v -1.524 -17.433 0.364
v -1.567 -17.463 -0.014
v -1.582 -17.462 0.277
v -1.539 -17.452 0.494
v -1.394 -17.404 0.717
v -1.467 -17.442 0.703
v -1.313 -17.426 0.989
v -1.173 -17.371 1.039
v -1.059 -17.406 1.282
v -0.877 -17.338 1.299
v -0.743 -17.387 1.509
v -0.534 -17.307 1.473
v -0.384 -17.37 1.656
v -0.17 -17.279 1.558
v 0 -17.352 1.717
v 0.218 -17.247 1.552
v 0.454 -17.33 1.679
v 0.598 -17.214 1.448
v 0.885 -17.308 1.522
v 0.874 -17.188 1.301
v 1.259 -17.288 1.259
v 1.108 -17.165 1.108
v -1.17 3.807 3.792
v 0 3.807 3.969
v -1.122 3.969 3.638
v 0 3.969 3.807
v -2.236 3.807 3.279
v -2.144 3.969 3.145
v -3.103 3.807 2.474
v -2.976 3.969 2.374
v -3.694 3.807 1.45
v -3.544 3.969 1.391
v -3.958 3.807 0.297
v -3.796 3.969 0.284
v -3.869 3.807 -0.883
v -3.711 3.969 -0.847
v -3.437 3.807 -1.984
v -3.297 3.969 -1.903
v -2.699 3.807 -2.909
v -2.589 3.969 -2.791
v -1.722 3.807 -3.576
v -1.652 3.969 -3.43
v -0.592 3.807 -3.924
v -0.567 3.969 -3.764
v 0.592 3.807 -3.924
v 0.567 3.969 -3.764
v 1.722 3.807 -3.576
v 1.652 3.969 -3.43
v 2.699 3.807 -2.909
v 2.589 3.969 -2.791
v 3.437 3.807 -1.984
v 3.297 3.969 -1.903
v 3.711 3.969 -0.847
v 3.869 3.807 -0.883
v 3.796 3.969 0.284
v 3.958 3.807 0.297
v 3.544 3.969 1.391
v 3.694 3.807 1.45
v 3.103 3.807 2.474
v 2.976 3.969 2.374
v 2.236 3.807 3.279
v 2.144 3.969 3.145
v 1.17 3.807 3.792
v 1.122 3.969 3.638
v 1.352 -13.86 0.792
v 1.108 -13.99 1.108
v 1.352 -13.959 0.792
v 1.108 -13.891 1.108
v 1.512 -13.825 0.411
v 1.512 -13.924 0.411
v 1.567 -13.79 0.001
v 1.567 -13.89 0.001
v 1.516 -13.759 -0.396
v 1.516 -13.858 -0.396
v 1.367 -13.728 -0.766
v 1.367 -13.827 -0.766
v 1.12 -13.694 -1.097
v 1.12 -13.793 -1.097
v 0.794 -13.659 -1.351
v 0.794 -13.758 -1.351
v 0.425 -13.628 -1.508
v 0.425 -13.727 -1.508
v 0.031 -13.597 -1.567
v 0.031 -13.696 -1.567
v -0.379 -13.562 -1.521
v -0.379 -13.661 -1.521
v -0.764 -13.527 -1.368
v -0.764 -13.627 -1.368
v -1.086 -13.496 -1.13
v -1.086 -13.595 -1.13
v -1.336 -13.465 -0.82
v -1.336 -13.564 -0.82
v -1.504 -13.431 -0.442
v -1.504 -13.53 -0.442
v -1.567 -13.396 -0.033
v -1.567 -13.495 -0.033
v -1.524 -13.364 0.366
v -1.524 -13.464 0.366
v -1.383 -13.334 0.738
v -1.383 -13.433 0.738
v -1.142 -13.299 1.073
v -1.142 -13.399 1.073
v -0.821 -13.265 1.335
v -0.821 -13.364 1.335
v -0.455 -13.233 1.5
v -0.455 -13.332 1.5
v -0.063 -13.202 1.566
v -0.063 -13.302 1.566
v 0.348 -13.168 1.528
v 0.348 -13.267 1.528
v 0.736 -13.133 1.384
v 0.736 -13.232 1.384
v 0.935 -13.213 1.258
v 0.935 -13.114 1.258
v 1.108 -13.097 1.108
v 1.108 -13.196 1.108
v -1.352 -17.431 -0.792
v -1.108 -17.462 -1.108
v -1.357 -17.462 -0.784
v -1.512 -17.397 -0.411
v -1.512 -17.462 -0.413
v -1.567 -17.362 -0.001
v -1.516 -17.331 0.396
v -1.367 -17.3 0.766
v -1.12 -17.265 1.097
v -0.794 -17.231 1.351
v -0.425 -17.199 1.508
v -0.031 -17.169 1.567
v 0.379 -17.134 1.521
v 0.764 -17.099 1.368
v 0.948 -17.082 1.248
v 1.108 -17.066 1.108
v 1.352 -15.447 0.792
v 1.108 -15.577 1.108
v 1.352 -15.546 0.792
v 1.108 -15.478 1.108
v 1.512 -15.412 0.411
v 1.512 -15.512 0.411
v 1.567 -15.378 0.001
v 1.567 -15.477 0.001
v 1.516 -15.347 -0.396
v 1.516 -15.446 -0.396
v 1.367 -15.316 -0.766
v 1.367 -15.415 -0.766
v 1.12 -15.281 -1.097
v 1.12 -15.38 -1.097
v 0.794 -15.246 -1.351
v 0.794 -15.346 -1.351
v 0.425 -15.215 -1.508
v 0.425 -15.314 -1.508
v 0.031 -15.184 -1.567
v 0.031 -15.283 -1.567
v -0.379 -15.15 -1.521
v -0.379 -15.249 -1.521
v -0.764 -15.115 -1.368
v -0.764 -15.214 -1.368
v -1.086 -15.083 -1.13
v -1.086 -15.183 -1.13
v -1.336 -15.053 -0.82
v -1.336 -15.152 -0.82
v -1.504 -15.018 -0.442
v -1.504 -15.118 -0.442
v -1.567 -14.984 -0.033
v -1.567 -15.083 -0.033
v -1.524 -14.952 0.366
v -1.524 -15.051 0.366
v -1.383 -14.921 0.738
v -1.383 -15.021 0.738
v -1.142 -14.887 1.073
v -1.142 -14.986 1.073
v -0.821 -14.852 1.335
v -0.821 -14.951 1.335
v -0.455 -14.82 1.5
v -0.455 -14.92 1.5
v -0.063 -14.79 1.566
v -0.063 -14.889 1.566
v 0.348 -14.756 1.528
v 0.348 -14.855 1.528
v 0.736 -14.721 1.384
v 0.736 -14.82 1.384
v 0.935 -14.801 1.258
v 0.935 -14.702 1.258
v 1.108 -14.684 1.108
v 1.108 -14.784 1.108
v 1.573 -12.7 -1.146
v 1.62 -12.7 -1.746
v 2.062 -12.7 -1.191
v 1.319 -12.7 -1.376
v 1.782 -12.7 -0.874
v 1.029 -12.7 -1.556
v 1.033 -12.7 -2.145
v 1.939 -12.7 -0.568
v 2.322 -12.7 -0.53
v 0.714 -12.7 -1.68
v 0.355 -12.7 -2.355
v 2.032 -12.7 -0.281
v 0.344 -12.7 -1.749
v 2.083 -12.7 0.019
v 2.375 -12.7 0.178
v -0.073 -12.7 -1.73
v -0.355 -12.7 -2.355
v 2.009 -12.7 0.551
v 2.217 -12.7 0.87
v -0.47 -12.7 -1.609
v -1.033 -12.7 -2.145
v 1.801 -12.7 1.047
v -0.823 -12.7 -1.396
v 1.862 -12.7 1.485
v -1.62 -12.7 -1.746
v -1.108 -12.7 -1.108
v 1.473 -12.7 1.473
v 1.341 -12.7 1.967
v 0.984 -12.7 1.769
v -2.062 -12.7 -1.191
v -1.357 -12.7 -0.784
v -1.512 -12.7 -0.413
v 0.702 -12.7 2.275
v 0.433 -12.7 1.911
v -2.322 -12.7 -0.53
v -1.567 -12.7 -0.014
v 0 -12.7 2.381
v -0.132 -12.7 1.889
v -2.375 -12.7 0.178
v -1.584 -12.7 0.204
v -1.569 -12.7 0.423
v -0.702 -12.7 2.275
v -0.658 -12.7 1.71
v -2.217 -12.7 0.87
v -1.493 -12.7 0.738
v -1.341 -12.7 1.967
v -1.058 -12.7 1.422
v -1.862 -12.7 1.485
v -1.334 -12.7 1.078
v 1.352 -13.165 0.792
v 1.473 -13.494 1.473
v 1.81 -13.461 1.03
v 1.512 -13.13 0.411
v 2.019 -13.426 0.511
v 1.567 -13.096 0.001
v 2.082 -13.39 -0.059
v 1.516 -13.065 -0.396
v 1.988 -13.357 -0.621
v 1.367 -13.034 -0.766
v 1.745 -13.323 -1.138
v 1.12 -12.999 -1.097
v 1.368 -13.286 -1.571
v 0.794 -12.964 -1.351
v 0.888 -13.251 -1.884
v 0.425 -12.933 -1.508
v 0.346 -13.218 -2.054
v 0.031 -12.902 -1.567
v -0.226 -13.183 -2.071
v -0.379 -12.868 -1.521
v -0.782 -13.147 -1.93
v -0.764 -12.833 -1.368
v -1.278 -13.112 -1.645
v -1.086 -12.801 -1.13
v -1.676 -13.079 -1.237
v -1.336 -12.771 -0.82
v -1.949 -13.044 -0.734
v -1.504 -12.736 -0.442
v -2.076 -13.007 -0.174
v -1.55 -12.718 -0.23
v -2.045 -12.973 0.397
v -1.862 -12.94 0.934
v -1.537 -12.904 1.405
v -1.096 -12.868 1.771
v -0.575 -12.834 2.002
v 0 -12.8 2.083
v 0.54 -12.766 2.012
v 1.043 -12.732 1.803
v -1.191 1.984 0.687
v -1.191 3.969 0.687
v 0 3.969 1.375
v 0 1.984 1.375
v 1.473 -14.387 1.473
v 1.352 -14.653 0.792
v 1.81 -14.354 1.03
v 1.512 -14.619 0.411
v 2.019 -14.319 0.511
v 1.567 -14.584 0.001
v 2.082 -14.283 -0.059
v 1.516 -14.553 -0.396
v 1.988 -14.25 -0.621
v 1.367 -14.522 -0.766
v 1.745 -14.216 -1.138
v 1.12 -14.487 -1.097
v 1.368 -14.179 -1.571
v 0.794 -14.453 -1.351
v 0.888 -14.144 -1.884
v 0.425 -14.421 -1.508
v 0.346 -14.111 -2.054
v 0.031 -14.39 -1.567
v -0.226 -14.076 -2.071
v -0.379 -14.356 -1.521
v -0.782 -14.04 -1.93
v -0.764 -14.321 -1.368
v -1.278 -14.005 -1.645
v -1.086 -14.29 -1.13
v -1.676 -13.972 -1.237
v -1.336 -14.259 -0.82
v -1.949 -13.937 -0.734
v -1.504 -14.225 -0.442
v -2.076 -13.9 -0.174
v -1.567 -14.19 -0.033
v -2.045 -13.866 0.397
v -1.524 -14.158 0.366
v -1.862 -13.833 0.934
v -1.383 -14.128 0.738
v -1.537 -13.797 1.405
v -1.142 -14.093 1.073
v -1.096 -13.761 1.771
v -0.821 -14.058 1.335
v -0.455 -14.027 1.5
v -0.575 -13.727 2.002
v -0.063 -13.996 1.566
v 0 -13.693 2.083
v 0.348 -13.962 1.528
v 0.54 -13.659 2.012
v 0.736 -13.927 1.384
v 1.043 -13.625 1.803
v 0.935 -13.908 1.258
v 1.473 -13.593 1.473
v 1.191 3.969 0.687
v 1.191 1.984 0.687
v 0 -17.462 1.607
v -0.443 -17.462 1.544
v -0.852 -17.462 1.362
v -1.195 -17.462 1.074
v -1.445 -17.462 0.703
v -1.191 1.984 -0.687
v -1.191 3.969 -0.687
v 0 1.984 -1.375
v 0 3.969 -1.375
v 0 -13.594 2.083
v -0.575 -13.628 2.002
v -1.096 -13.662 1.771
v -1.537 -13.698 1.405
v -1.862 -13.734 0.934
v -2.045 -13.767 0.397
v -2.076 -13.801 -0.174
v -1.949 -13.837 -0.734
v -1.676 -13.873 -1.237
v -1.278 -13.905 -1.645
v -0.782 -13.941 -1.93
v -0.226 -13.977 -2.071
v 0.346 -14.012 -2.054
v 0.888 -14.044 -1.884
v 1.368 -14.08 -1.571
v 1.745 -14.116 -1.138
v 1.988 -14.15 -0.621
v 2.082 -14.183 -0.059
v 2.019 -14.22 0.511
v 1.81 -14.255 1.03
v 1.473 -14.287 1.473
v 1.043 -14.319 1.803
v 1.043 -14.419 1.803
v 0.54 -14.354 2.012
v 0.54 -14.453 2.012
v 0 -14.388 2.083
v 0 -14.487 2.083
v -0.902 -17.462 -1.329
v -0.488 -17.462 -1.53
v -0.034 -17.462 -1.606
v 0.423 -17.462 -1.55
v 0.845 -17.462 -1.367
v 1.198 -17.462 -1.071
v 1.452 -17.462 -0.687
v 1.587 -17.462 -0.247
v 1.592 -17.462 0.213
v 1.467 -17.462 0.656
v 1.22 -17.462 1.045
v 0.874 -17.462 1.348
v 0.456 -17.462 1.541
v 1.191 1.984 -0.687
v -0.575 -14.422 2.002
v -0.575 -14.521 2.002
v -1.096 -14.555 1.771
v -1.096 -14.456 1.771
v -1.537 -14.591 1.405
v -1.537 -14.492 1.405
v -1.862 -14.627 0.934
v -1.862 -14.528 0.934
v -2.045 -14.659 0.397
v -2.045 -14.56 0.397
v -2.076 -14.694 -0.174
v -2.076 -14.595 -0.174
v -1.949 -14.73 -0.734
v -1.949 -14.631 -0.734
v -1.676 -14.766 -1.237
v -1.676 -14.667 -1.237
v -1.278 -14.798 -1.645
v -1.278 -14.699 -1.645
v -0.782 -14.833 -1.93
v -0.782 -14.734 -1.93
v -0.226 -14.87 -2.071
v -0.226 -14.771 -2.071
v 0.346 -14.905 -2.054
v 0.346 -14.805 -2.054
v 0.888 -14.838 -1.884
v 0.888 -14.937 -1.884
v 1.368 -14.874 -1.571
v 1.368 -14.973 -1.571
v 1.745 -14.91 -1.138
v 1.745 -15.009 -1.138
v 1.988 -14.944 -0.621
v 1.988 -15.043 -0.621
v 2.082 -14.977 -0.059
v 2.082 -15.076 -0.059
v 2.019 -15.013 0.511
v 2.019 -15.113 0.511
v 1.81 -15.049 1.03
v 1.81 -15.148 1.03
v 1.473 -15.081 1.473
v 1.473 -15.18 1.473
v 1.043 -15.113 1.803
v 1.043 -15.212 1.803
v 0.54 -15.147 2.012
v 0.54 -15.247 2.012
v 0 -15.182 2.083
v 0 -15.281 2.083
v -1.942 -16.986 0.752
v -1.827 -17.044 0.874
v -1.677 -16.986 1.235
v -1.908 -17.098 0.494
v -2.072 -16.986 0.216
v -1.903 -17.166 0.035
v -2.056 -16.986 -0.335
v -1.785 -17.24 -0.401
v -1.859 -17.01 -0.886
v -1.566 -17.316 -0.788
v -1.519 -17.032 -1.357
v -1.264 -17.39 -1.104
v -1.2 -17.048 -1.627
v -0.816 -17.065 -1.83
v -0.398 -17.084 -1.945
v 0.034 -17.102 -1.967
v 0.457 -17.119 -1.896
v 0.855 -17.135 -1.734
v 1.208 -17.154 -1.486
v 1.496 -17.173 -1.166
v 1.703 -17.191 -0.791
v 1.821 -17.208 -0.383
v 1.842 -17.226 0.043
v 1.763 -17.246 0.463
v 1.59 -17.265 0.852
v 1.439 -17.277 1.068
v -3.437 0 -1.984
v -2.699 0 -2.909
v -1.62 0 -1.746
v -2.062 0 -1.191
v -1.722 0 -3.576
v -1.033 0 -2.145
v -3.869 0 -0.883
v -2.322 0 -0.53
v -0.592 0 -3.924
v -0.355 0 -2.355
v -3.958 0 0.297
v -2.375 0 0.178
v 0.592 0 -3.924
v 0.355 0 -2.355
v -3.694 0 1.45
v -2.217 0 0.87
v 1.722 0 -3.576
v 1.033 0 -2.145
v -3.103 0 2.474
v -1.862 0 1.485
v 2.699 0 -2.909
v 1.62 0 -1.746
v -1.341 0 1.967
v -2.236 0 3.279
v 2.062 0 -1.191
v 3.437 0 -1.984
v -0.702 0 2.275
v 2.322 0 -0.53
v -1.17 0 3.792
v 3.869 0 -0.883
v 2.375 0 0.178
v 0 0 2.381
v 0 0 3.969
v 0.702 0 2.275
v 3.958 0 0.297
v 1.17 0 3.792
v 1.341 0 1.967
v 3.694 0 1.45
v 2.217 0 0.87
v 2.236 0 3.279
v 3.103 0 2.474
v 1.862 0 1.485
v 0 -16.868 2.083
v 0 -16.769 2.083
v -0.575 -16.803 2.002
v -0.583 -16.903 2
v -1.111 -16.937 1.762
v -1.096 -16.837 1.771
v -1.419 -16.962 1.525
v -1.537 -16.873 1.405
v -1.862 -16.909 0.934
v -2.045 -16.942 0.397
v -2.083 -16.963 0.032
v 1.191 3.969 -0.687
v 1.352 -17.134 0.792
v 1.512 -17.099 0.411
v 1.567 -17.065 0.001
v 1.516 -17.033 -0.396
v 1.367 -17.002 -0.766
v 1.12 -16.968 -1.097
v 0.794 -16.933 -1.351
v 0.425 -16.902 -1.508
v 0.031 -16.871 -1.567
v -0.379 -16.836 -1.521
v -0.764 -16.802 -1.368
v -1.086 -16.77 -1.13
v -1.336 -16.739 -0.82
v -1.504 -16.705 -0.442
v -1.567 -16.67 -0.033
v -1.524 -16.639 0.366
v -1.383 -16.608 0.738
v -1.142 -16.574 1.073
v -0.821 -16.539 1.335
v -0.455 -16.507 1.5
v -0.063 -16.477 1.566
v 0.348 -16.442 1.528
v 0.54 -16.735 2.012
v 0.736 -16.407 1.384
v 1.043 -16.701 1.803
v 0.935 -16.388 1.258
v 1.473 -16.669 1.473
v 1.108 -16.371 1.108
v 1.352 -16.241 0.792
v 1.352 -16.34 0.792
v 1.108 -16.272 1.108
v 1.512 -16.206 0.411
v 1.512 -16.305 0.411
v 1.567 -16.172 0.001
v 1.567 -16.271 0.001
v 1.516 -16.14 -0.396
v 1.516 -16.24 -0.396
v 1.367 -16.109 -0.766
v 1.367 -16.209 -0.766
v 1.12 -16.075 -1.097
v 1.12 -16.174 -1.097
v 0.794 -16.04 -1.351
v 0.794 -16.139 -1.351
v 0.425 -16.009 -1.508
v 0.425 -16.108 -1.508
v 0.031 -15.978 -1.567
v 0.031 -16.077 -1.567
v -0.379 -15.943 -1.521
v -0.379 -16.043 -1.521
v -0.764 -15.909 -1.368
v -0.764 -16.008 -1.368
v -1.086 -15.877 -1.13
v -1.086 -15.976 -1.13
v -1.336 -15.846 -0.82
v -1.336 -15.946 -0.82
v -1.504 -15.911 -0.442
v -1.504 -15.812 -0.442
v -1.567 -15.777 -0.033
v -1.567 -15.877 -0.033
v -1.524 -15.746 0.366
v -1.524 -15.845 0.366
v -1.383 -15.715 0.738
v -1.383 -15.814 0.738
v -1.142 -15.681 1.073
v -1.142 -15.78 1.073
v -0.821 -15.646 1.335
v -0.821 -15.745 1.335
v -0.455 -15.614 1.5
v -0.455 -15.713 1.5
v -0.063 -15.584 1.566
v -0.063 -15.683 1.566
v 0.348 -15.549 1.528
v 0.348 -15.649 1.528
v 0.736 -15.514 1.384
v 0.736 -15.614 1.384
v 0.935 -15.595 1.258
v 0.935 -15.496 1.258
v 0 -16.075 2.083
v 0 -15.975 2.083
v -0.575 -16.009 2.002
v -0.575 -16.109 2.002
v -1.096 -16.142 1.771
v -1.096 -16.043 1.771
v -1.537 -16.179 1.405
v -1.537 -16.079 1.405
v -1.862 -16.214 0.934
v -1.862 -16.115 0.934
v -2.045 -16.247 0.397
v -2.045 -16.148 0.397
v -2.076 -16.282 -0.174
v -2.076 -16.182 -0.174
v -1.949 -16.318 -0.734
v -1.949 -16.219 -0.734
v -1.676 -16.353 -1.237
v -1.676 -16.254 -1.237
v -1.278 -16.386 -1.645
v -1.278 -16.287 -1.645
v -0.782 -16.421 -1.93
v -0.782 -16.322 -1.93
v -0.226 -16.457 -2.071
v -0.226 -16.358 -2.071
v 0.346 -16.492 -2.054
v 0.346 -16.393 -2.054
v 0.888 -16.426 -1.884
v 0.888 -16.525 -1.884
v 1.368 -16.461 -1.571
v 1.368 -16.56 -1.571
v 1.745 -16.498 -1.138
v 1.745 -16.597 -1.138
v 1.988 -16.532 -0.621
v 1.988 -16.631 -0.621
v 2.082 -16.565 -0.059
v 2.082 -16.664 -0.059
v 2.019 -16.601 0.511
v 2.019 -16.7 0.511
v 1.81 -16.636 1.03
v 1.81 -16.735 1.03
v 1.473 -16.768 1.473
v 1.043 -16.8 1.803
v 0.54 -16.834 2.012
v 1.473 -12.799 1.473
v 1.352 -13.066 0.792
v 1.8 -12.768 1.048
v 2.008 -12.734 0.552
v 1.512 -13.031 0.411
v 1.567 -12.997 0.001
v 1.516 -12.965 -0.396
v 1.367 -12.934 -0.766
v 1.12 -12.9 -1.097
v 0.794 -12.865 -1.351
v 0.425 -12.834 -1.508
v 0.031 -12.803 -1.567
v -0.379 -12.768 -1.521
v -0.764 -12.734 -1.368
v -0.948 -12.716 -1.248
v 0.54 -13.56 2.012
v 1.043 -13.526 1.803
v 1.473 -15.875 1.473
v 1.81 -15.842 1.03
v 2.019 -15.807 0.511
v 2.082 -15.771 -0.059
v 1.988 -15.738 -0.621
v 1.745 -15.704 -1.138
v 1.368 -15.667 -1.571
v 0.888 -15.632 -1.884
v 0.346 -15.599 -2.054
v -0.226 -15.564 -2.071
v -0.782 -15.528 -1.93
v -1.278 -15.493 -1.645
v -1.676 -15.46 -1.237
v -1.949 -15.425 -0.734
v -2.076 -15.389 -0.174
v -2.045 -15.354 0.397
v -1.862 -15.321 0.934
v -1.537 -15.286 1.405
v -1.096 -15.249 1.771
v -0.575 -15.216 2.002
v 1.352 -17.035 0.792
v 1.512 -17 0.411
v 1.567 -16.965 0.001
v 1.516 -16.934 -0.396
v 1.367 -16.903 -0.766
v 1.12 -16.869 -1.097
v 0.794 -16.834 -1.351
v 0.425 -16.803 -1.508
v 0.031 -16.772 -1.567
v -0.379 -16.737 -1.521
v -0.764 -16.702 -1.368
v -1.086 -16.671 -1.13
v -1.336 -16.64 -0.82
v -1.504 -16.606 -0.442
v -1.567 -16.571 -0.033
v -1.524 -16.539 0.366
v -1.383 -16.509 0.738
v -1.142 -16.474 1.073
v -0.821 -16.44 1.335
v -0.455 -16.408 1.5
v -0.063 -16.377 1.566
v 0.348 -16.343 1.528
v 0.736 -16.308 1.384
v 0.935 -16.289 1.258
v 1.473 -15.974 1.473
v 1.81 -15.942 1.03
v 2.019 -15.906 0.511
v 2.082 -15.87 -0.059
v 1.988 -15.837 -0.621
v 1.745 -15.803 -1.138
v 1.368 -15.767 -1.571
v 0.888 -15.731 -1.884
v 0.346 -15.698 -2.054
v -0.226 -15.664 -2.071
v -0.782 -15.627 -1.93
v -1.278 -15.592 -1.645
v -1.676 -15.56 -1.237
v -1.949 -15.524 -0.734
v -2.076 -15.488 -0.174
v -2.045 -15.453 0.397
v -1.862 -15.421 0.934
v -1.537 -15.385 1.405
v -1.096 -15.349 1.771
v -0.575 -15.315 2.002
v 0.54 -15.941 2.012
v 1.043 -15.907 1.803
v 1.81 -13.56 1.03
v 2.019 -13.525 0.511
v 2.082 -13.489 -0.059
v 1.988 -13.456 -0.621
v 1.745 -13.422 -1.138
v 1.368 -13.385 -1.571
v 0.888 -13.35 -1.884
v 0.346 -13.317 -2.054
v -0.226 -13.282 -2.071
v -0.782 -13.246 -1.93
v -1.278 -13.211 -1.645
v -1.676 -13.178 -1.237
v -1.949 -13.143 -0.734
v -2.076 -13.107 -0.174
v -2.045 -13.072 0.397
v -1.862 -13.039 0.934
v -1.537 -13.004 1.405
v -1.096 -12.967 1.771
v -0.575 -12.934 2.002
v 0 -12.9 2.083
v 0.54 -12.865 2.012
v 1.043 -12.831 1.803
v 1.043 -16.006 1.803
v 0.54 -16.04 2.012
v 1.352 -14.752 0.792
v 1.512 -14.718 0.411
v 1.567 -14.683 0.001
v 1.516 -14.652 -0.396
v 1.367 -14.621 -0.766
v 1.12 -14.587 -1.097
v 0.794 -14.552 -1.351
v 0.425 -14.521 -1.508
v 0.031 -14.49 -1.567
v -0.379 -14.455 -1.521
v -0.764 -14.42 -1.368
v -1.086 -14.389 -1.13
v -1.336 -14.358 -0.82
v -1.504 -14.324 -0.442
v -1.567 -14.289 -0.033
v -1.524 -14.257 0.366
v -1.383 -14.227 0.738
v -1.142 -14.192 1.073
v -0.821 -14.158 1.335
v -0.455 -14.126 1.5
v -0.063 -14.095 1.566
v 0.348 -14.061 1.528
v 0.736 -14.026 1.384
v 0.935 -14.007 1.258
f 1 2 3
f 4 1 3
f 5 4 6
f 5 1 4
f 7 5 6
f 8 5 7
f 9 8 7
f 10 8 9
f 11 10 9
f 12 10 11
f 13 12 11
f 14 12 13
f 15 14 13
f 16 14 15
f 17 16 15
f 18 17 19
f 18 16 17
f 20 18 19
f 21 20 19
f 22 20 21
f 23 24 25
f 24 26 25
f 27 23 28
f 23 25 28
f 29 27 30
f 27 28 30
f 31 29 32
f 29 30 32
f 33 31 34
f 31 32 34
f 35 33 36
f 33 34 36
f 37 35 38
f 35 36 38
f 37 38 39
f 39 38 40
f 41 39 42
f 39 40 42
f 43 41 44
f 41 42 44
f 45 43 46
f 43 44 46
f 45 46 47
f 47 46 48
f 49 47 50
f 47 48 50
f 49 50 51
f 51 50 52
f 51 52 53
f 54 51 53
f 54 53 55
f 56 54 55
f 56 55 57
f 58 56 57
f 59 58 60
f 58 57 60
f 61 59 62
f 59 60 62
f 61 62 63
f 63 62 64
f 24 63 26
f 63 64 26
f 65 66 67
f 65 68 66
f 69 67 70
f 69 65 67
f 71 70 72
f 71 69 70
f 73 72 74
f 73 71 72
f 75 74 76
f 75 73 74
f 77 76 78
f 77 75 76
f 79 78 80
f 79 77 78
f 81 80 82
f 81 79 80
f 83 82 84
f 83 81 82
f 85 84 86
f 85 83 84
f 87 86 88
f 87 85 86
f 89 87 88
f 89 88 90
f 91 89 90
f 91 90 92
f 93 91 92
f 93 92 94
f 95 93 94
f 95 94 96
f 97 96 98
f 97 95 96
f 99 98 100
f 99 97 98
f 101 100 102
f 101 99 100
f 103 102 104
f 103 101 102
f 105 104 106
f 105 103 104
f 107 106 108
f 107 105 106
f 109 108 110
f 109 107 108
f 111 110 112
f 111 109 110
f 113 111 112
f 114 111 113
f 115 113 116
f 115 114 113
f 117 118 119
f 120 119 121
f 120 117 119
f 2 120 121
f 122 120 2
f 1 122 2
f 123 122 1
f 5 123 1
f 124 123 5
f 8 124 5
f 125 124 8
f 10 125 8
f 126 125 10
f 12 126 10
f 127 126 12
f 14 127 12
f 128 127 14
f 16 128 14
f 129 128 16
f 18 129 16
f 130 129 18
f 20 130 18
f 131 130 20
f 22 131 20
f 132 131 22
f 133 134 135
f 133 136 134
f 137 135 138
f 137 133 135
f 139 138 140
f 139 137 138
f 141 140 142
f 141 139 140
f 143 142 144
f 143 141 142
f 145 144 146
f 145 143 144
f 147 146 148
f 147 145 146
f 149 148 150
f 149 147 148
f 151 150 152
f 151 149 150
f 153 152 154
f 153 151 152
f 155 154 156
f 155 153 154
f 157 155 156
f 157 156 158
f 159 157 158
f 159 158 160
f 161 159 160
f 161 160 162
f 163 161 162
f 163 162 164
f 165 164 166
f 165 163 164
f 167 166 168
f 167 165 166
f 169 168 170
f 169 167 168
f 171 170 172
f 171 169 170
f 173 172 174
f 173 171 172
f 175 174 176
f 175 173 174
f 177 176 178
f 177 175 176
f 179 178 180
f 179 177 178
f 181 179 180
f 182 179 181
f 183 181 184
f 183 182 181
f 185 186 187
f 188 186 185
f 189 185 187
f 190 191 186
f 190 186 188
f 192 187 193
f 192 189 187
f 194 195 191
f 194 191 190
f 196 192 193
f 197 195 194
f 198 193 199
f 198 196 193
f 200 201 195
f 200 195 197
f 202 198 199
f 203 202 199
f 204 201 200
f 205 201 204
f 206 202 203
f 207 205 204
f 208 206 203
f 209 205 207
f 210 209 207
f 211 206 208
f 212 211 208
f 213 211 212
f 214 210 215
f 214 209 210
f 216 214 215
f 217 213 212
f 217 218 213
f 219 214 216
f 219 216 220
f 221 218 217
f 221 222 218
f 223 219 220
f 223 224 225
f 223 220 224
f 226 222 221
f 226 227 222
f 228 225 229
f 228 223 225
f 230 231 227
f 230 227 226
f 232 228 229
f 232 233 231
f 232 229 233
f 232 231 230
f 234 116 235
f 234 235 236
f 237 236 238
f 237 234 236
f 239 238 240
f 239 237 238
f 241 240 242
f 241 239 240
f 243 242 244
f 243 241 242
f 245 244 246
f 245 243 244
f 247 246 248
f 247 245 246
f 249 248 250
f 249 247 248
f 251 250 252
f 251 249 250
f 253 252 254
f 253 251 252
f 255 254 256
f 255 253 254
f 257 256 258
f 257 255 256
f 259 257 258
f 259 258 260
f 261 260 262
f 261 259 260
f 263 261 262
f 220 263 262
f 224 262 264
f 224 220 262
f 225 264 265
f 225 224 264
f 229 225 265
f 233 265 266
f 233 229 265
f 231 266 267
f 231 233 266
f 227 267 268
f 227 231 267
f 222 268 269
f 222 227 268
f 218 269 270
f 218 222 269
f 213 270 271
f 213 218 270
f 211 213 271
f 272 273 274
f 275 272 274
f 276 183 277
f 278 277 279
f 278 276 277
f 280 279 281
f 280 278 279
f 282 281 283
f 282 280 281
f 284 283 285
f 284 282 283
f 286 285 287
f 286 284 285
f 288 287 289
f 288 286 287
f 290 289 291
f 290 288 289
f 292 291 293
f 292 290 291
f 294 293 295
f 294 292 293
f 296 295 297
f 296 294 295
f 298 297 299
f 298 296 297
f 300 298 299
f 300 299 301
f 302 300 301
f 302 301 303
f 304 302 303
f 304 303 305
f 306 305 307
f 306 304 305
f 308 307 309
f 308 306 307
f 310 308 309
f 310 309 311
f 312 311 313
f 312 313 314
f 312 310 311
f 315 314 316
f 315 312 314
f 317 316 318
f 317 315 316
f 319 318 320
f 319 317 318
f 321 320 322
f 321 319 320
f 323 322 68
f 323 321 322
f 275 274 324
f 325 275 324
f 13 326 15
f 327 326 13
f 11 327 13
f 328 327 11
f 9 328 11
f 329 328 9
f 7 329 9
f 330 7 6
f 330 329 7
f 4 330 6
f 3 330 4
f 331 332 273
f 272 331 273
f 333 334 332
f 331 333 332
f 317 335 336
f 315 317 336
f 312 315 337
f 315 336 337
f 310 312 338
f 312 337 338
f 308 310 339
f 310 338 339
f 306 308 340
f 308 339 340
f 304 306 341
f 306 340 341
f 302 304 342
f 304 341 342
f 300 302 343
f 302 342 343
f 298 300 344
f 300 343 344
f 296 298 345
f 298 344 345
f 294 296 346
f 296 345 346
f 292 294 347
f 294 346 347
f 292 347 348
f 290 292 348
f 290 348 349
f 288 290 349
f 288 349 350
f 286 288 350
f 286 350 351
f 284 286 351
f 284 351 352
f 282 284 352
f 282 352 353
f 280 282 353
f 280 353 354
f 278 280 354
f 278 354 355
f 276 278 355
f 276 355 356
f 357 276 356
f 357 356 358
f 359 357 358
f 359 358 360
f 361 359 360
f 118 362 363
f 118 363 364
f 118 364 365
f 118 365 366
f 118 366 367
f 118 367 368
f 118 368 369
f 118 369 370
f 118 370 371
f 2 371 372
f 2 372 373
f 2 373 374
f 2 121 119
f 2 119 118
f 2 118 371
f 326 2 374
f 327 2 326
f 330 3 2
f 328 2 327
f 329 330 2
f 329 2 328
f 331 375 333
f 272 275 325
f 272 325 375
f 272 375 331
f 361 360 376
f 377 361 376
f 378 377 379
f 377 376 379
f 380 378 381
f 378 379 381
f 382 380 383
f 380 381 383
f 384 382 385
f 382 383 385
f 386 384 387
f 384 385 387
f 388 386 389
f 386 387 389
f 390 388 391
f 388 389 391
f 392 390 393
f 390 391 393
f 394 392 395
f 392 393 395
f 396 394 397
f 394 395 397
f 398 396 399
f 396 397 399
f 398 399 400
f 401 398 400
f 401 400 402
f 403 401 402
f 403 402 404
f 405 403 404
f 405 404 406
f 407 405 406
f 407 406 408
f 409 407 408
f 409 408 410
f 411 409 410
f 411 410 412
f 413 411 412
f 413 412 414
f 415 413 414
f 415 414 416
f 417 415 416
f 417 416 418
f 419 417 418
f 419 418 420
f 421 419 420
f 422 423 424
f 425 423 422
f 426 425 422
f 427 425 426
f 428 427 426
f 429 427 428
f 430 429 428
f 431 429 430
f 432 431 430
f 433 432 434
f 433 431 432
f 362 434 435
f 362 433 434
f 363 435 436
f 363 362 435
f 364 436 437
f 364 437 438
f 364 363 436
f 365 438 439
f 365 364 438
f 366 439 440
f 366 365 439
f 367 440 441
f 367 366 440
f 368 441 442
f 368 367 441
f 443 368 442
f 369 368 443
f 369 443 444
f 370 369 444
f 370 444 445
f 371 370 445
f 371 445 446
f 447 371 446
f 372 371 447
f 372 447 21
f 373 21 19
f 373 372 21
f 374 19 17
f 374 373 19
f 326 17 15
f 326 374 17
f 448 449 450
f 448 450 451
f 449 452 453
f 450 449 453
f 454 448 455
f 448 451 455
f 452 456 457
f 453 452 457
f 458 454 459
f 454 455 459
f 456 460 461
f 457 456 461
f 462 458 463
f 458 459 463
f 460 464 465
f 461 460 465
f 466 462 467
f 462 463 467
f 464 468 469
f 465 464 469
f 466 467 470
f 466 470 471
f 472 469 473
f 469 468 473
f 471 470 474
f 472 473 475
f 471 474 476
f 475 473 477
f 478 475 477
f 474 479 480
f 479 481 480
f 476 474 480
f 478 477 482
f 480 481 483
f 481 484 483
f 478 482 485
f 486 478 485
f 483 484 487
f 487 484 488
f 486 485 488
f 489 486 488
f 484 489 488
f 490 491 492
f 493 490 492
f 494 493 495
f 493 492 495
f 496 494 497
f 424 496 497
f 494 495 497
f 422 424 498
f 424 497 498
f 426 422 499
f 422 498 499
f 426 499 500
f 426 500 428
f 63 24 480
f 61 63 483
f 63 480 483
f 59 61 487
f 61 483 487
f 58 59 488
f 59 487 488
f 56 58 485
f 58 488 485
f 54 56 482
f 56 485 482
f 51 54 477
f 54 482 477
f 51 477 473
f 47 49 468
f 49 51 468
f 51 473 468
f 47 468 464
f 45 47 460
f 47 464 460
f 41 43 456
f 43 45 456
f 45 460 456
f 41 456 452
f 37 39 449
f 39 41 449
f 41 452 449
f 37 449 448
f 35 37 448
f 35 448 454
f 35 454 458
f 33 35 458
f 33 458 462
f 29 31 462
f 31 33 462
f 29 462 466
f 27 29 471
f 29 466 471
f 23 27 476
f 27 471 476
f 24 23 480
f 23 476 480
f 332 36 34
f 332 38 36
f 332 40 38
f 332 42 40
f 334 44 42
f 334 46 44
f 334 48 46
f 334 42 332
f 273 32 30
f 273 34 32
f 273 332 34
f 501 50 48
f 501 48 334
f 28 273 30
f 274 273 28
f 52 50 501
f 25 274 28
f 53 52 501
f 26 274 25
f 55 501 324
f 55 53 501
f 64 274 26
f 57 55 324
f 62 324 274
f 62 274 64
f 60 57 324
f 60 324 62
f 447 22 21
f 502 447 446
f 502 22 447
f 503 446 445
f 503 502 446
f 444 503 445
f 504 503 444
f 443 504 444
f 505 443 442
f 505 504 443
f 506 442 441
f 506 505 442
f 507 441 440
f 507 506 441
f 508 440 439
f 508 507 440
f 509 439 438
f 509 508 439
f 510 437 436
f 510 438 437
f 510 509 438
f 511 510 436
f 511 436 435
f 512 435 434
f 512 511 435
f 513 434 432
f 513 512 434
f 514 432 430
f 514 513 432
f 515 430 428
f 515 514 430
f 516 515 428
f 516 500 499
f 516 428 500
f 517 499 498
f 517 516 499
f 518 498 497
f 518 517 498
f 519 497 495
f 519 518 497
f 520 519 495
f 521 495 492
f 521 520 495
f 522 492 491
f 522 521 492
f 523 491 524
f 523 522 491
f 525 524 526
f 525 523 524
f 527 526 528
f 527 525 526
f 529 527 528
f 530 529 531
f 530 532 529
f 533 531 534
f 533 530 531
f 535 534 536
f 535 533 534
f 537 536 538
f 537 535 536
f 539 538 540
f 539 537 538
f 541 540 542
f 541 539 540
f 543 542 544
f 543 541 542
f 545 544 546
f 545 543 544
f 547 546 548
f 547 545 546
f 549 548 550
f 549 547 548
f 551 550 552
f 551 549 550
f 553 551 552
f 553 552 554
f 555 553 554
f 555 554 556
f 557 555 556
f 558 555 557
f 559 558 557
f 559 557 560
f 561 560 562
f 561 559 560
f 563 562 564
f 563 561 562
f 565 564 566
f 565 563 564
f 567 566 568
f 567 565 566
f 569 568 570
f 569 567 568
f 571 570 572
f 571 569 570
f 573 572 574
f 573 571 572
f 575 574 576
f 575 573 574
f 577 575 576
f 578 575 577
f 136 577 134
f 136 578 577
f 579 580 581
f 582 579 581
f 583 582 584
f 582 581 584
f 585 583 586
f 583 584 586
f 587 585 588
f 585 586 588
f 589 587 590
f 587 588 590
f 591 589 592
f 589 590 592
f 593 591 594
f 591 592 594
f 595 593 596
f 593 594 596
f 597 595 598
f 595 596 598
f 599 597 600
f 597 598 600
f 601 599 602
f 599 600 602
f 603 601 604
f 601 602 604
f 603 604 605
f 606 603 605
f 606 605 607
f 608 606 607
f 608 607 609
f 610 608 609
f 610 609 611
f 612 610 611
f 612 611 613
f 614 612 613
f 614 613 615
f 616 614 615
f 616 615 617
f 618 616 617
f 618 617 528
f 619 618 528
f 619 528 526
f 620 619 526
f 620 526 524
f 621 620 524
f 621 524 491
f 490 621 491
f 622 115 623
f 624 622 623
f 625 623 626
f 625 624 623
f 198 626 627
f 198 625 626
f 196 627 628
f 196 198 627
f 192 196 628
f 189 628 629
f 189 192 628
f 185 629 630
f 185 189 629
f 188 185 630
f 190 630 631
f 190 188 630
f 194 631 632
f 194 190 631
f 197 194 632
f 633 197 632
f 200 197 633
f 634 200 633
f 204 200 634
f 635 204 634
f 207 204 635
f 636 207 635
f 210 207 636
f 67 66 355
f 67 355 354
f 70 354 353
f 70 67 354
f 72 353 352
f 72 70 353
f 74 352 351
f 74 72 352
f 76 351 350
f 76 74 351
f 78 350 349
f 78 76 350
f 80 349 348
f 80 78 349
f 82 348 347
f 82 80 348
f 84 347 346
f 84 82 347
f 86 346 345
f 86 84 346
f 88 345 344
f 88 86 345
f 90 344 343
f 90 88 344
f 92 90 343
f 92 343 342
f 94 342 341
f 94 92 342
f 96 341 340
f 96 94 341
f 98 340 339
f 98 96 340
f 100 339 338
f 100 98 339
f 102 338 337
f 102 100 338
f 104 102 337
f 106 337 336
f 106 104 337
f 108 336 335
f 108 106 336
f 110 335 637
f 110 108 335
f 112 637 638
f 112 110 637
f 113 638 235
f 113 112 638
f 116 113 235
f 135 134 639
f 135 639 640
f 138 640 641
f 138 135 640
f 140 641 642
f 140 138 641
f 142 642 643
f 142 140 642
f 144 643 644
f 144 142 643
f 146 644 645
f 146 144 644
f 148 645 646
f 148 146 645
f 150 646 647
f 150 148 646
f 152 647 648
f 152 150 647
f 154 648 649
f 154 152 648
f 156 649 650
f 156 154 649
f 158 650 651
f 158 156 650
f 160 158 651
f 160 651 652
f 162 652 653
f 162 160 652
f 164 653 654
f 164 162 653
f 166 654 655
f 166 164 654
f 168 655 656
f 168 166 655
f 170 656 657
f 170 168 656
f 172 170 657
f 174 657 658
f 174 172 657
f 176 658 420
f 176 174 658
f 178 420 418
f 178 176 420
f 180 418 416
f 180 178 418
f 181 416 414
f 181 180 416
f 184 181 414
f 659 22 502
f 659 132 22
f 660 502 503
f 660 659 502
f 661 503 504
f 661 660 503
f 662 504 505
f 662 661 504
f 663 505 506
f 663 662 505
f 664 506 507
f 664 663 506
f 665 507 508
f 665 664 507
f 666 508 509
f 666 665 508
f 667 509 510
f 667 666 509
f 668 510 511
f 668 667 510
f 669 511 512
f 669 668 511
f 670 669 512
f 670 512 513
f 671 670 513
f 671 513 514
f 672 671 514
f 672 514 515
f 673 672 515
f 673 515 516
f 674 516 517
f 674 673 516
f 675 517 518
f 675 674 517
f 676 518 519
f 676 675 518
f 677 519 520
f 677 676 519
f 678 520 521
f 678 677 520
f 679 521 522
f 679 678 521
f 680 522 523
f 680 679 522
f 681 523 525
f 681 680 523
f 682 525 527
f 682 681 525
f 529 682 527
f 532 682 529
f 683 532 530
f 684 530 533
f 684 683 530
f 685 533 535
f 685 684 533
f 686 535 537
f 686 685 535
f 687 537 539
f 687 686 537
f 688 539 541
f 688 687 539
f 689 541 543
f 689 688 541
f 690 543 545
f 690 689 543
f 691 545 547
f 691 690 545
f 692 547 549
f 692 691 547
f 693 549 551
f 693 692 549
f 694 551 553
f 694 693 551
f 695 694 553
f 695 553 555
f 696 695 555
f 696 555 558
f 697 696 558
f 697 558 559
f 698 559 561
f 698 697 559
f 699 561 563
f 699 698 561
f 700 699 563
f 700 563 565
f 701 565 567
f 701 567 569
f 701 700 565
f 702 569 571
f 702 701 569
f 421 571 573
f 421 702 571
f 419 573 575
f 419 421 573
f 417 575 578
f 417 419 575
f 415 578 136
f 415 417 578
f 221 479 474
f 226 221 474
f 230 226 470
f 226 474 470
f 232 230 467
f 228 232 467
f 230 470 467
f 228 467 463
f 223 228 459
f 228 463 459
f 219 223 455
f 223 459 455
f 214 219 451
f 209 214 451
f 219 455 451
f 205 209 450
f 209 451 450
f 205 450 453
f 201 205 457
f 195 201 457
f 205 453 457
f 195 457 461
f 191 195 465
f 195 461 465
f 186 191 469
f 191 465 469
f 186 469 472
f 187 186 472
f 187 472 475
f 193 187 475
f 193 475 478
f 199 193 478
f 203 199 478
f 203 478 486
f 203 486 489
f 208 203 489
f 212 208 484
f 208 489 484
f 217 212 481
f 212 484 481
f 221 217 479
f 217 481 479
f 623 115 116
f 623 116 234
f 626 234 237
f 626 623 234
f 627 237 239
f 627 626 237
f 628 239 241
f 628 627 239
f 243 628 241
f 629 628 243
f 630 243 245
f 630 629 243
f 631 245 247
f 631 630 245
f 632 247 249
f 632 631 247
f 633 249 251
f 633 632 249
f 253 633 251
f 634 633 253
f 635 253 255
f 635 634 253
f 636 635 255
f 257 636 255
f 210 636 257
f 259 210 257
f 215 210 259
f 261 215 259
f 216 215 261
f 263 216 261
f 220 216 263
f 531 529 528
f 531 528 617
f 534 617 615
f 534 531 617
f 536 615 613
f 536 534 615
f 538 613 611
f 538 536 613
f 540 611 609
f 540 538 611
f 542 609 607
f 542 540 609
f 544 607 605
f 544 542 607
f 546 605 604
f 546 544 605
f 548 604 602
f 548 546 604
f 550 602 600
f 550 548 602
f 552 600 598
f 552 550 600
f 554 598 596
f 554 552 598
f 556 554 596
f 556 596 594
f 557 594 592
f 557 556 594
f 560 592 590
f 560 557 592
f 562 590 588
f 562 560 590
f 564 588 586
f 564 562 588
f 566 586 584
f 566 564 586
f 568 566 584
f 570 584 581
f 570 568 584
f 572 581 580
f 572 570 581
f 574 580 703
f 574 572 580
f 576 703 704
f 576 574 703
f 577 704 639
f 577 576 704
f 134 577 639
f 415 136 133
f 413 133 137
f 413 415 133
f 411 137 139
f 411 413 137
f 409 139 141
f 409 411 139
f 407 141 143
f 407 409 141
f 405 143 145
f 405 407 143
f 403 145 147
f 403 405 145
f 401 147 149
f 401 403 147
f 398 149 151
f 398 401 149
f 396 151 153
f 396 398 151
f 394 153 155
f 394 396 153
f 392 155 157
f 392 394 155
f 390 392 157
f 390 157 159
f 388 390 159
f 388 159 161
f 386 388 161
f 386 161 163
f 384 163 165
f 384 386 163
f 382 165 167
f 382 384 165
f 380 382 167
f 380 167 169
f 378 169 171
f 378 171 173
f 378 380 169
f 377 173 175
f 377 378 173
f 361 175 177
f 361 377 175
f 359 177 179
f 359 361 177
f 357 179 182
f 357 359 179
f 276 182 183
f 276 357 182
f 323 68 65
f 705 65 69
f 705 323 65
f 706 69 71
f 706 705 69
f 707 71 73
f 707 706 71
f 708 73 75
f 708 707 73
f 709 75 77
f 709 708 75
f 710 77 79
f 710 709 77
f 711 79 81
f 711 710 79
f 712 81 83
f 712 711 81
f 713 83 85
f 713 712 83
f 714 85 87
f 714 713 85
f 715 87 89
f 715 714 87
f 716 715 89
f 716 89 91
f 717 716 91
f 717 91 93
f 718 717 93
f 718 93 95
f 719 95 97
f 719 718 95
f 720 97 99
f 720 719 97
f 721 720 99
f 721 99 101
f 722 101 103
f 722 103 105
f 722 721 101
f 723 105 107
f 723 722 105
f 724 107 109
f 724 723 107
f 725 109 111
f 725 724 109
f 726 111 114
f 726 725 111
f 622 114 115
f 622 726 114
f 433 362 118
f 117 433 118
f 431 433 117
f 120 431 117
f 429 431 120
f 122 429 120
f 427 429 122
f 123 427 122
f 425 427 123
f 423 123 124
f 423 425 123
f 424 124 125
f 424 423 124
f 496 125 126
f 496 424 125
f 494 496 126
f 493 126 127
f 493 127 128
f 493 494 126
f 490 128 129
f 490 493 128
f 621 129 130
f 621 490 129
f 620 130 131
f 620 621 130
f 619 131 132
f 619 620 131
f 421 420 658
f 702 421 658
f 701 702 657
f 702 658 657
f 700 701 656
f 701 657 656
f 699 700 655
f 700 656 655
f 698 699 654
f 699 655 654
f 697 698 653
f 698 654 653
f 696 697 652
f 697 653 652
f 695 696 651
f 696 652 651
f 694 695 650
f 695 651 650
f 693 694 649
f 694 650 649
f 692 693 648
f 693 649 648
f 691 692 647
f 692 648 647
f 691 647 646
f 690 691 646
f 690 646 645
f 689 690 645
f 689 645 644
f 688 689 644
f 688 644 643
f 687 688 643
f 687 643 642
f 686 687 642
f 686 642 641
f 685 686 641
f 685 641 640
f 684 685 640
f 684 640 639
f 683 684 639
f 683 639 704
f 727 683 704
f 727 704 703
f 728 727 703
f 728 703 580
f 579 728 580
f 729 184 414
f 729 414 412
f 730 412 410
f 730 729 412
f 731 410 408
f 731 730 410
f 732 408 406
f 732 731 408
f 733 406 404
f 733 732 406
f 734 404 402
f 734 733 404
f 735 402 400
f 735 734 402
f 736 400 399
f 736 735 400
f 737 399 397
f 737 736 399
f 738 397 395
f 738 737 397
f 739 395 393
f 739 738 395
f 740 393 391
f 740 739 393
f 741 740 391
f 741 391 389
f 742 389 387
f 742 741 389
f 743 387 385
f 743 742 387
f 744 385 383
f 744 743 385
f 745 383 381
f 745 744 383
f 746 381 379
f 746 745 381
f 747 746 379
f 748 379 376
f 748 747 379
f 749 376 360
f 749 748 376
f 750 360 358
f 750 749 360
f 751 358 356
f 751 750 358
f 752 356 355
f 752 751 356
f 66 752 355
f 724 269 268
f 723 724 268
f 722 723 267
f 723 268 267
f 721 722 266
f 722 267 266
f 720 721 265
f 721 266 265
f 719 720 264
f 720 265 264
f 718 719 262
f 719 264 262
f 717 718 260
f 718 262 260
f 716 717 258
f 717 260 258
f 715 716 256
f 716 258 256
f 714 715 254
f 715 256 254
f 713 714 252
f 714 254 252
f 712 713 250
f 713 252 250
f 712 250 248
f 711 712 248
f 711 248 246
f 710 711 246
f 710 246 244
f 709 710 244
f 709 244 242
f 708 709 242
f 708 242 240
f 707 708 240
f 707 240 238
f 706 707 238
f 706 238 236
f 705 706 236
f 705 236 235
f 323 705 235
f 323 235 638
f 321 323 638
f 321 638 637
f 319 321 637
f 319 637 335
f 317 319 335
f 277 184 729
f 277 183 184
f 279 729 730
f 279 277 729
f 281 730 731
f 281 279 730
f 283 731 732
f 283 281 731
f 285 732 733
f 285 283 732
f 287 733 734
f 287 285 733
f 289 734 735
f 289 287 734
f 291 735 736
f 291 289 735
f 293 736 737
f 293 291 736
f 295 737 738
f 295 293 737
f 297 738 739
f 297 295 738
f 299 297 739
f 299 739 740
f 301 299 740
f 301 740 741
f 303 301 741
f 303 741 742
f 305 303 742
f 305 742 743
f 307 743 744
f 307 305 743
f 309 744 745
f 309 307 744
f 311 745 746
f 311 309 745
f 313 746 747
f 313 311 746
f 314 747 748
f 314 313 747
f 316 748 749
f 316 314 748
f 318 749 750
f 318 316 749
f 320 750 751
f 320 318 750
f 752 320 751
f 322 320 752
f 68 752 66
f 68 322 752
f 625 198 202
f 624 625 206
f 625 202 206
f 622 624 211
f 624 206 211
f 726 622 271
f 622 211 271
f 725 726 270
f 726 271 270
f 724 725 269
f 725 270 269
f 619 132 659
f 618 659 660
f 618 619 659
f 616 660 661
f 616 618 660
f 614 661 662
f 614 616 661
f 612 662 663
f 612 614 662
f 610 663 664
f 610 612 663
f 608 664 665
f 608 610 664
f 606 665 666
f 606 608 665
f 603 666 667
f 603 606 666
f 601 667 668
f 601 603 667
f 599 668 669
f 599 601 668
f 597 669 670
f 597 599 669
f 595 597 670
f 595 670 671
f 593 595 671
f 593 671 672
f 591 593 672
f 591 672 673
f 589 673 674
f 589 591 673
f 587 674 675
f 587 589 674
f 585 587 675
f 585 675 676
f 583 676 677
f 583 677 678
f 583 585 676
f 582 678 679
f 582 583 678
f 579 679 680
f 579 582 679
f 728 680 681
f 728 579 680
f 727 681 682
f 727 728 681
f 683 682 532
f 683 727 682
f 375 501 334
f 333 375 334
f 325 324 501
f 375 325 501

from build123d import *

# Parameters (mm, degrees)
SKETCH1_R          = 3.96875
EXTRUDE1_DEPTH     = 3.96875
CUT_EXTRUDE1_DEPTH = 1.984375
SKETCH4_R          = 2.38125
EXTRUDE2_DEPTH     = 12.7
SKETCH5_R          = 2.0828
EXTRUDE3_DEPTH     = 4.7625
CHAMFER1_SIZE      = 0.47625
CUT_SWEEP1_PITCH   = 0.79375
CUT_SWEEP1_TO      = 4.7625


with BuildPart() as part:
    # Sketch1 → Extrude1 (new body)
    with BuildSketch(Plane(origin=(0, 0, 0), x_dir=(1, 0, 0), z_dir=(0, 1, 0))):
        with Locations(Location((0, 0, 0), (0, 0, 270))):
            Circle(SKETCH1_R)
    extrude(amount=EXTRUDE1_DEPTH)

    # Sketch2 → Cut-Extrude1 (cut)
    with BuildSketch(Plane(origin=(0, 3.96875, 0), x_dir=(-1, 0, 0), z_dir=(0, 1, 0))):
        Polygon((0, -1.374815329), (1.190625, -0.687407664), (1.190625, 0.687407664), (0, 1.374815329), (-1.190625, 0.687407664), (-1.190625, -0.687407664), align=None)
    extrude(amount=-CUT_EXTRUDE1_DEPTH, mode=Mode.SUBTRACT)

    # Sketch4 → Extrude2 (add)
    with BuildSketch(Plane.XZ):
        with Locations(Location((0, 0, 0), (0, 0, 90))):
            Circle(SKETCH4_R)
    extrude(amount=EXTRUDE2_DEPTH)

    # Sketch5 → Extrude3 (add)
    with BuildSketch(Plane.XZ.offset(12.7)):
        with Locations(Location((0, 0, 0), (0, 0, 90))):
            Circle(SKETCH5_R)
    extrude(amount=EXTRUDE3_DEPTH)

    # Chamfer1
    chamfer1_edges = [part.edges().sort_by_distance(p)[0] for p in [
        (0, -17.4625, -2.0828),
    ]]
    chamfer(chamfer1_edges, length=CHAMFER1_SIZE)

    # Cut-Sweep1: arcs per turn and ends read off the stored shape
    # Cut-Sweep1: the profile of Sketch13 profile screwed along a right-hand helix through 7 turns, 6 arcs to a turn; built about Z, then put on its axis
    cut_sweep1_z = Axis((0, 0, 0), (0, 0, 1))
    cut_sweep1_corners = [(2.0831, 0, -0.099045545), (2.0831, 0, -0.793923205), (1.567244252, 0, -0.49609375), (1.567244252, 0, -0.396875)]
    with BuildLine(mode=Mode.PRIVATE) as cut_sweep1_profile:
        Line(cut_sweep1_corners[0], cut_sweep1_corners[1])
        Line(cut_sweep1_corners[1], cut_sweep1_corners[2])
        Line(cut_sweep1_corners[2], cut_sweep1_corners[3])
        Line(cut_sweep1_corners[3], cut_sweep1_corners[0])
    cut_sweep1_cap = Face(cut_sweep1_profile.wire())
    cut_sweep1_turn_angles = [0, 30, 60, 90, 120, 150, 180, 210, 240, 270, 300, 330, 360]
    cut_sweep1_turn_weights = [1, 0.8660254037844387, 1, 0.8660254037844387, 1, 0.8660254037844387, 1, 0.8660254037844387, 1, 0.8660254037844387, 1, 0.8660254037844387, 1]
    cut_sweep1_turn_rails = [Edge.make_bspline([Vector(p[0], p[1], 0).rotate(cut_sweep1_z, cut_sweep1_turn_angles[k]) / cut_sweep1_turn_weights[k] + Vector(0, 0, p[2] + CUT_SWEEP1_PITCH * cut_sweep1_turn_angles[k] / 360) for k in range(13)], [0, 0, 0, 1, 1, 2, 2, 3, 3, 4, 4, 5, 5, 6, 6, 6], 2, cut_sweep1_turn_weights) for p in cut_sweep1_corners]
    cut_sweep1_turn_sides = [Face.make_surface_from_curves(cut_sweep1_turn_rails[p[0]], cut_sweep1_turn_rails[p[1]]) for p in [(0, 1), (1, 2), (2, 3), (3, 0)]]
    cut_sweep1 = Plane(origin=(0, -17.4625, 0), x_dir=(0.7071067811865438, 0, 0.7071067811865512), z_dir=(0, 1, 0)) * split(Solid(Shell([*[p.moved(Location((0, 0, CUT_SWEEP1_PITCH * i))) for i in range(7) for p in cut_sweep1_turn_sides], cut_sweep1_cap, cut_sweep1_cap.rotate(cut_sweep1_z, 2520).moved(Location((0, 0, CUT_SWEEP1_PITCH * 2520 / 360)))])), bisect_by=Plane.XY.offset(CUT_SWEEP1_TO), keep=Keep.BOTTOM, mode=Mode.PRIVATE)
    add(cut_sweep1, mode=Mode.SUBTRACT)

    # Sketch11 → Cut-Revolve7 (revolve, cut)
    with BuildSketch(Plane.XY, mode=Mode.PRIVATE) as cut_revolve7_sk:
        Polygon((3.96875, 3.806888221), (3.806888221, 3.96875), (3.96875, 3.96875), align=None)
    revolve(cut_revolve7_sk.sketch.rotate(Axis((0, 14.544175091, 0), (0, -1, 0)), 90), axis=Axis((0, 14.544175091, 0), (0, -1, 0)), mode=Mode.SUBTRACT)


solid = part.part
